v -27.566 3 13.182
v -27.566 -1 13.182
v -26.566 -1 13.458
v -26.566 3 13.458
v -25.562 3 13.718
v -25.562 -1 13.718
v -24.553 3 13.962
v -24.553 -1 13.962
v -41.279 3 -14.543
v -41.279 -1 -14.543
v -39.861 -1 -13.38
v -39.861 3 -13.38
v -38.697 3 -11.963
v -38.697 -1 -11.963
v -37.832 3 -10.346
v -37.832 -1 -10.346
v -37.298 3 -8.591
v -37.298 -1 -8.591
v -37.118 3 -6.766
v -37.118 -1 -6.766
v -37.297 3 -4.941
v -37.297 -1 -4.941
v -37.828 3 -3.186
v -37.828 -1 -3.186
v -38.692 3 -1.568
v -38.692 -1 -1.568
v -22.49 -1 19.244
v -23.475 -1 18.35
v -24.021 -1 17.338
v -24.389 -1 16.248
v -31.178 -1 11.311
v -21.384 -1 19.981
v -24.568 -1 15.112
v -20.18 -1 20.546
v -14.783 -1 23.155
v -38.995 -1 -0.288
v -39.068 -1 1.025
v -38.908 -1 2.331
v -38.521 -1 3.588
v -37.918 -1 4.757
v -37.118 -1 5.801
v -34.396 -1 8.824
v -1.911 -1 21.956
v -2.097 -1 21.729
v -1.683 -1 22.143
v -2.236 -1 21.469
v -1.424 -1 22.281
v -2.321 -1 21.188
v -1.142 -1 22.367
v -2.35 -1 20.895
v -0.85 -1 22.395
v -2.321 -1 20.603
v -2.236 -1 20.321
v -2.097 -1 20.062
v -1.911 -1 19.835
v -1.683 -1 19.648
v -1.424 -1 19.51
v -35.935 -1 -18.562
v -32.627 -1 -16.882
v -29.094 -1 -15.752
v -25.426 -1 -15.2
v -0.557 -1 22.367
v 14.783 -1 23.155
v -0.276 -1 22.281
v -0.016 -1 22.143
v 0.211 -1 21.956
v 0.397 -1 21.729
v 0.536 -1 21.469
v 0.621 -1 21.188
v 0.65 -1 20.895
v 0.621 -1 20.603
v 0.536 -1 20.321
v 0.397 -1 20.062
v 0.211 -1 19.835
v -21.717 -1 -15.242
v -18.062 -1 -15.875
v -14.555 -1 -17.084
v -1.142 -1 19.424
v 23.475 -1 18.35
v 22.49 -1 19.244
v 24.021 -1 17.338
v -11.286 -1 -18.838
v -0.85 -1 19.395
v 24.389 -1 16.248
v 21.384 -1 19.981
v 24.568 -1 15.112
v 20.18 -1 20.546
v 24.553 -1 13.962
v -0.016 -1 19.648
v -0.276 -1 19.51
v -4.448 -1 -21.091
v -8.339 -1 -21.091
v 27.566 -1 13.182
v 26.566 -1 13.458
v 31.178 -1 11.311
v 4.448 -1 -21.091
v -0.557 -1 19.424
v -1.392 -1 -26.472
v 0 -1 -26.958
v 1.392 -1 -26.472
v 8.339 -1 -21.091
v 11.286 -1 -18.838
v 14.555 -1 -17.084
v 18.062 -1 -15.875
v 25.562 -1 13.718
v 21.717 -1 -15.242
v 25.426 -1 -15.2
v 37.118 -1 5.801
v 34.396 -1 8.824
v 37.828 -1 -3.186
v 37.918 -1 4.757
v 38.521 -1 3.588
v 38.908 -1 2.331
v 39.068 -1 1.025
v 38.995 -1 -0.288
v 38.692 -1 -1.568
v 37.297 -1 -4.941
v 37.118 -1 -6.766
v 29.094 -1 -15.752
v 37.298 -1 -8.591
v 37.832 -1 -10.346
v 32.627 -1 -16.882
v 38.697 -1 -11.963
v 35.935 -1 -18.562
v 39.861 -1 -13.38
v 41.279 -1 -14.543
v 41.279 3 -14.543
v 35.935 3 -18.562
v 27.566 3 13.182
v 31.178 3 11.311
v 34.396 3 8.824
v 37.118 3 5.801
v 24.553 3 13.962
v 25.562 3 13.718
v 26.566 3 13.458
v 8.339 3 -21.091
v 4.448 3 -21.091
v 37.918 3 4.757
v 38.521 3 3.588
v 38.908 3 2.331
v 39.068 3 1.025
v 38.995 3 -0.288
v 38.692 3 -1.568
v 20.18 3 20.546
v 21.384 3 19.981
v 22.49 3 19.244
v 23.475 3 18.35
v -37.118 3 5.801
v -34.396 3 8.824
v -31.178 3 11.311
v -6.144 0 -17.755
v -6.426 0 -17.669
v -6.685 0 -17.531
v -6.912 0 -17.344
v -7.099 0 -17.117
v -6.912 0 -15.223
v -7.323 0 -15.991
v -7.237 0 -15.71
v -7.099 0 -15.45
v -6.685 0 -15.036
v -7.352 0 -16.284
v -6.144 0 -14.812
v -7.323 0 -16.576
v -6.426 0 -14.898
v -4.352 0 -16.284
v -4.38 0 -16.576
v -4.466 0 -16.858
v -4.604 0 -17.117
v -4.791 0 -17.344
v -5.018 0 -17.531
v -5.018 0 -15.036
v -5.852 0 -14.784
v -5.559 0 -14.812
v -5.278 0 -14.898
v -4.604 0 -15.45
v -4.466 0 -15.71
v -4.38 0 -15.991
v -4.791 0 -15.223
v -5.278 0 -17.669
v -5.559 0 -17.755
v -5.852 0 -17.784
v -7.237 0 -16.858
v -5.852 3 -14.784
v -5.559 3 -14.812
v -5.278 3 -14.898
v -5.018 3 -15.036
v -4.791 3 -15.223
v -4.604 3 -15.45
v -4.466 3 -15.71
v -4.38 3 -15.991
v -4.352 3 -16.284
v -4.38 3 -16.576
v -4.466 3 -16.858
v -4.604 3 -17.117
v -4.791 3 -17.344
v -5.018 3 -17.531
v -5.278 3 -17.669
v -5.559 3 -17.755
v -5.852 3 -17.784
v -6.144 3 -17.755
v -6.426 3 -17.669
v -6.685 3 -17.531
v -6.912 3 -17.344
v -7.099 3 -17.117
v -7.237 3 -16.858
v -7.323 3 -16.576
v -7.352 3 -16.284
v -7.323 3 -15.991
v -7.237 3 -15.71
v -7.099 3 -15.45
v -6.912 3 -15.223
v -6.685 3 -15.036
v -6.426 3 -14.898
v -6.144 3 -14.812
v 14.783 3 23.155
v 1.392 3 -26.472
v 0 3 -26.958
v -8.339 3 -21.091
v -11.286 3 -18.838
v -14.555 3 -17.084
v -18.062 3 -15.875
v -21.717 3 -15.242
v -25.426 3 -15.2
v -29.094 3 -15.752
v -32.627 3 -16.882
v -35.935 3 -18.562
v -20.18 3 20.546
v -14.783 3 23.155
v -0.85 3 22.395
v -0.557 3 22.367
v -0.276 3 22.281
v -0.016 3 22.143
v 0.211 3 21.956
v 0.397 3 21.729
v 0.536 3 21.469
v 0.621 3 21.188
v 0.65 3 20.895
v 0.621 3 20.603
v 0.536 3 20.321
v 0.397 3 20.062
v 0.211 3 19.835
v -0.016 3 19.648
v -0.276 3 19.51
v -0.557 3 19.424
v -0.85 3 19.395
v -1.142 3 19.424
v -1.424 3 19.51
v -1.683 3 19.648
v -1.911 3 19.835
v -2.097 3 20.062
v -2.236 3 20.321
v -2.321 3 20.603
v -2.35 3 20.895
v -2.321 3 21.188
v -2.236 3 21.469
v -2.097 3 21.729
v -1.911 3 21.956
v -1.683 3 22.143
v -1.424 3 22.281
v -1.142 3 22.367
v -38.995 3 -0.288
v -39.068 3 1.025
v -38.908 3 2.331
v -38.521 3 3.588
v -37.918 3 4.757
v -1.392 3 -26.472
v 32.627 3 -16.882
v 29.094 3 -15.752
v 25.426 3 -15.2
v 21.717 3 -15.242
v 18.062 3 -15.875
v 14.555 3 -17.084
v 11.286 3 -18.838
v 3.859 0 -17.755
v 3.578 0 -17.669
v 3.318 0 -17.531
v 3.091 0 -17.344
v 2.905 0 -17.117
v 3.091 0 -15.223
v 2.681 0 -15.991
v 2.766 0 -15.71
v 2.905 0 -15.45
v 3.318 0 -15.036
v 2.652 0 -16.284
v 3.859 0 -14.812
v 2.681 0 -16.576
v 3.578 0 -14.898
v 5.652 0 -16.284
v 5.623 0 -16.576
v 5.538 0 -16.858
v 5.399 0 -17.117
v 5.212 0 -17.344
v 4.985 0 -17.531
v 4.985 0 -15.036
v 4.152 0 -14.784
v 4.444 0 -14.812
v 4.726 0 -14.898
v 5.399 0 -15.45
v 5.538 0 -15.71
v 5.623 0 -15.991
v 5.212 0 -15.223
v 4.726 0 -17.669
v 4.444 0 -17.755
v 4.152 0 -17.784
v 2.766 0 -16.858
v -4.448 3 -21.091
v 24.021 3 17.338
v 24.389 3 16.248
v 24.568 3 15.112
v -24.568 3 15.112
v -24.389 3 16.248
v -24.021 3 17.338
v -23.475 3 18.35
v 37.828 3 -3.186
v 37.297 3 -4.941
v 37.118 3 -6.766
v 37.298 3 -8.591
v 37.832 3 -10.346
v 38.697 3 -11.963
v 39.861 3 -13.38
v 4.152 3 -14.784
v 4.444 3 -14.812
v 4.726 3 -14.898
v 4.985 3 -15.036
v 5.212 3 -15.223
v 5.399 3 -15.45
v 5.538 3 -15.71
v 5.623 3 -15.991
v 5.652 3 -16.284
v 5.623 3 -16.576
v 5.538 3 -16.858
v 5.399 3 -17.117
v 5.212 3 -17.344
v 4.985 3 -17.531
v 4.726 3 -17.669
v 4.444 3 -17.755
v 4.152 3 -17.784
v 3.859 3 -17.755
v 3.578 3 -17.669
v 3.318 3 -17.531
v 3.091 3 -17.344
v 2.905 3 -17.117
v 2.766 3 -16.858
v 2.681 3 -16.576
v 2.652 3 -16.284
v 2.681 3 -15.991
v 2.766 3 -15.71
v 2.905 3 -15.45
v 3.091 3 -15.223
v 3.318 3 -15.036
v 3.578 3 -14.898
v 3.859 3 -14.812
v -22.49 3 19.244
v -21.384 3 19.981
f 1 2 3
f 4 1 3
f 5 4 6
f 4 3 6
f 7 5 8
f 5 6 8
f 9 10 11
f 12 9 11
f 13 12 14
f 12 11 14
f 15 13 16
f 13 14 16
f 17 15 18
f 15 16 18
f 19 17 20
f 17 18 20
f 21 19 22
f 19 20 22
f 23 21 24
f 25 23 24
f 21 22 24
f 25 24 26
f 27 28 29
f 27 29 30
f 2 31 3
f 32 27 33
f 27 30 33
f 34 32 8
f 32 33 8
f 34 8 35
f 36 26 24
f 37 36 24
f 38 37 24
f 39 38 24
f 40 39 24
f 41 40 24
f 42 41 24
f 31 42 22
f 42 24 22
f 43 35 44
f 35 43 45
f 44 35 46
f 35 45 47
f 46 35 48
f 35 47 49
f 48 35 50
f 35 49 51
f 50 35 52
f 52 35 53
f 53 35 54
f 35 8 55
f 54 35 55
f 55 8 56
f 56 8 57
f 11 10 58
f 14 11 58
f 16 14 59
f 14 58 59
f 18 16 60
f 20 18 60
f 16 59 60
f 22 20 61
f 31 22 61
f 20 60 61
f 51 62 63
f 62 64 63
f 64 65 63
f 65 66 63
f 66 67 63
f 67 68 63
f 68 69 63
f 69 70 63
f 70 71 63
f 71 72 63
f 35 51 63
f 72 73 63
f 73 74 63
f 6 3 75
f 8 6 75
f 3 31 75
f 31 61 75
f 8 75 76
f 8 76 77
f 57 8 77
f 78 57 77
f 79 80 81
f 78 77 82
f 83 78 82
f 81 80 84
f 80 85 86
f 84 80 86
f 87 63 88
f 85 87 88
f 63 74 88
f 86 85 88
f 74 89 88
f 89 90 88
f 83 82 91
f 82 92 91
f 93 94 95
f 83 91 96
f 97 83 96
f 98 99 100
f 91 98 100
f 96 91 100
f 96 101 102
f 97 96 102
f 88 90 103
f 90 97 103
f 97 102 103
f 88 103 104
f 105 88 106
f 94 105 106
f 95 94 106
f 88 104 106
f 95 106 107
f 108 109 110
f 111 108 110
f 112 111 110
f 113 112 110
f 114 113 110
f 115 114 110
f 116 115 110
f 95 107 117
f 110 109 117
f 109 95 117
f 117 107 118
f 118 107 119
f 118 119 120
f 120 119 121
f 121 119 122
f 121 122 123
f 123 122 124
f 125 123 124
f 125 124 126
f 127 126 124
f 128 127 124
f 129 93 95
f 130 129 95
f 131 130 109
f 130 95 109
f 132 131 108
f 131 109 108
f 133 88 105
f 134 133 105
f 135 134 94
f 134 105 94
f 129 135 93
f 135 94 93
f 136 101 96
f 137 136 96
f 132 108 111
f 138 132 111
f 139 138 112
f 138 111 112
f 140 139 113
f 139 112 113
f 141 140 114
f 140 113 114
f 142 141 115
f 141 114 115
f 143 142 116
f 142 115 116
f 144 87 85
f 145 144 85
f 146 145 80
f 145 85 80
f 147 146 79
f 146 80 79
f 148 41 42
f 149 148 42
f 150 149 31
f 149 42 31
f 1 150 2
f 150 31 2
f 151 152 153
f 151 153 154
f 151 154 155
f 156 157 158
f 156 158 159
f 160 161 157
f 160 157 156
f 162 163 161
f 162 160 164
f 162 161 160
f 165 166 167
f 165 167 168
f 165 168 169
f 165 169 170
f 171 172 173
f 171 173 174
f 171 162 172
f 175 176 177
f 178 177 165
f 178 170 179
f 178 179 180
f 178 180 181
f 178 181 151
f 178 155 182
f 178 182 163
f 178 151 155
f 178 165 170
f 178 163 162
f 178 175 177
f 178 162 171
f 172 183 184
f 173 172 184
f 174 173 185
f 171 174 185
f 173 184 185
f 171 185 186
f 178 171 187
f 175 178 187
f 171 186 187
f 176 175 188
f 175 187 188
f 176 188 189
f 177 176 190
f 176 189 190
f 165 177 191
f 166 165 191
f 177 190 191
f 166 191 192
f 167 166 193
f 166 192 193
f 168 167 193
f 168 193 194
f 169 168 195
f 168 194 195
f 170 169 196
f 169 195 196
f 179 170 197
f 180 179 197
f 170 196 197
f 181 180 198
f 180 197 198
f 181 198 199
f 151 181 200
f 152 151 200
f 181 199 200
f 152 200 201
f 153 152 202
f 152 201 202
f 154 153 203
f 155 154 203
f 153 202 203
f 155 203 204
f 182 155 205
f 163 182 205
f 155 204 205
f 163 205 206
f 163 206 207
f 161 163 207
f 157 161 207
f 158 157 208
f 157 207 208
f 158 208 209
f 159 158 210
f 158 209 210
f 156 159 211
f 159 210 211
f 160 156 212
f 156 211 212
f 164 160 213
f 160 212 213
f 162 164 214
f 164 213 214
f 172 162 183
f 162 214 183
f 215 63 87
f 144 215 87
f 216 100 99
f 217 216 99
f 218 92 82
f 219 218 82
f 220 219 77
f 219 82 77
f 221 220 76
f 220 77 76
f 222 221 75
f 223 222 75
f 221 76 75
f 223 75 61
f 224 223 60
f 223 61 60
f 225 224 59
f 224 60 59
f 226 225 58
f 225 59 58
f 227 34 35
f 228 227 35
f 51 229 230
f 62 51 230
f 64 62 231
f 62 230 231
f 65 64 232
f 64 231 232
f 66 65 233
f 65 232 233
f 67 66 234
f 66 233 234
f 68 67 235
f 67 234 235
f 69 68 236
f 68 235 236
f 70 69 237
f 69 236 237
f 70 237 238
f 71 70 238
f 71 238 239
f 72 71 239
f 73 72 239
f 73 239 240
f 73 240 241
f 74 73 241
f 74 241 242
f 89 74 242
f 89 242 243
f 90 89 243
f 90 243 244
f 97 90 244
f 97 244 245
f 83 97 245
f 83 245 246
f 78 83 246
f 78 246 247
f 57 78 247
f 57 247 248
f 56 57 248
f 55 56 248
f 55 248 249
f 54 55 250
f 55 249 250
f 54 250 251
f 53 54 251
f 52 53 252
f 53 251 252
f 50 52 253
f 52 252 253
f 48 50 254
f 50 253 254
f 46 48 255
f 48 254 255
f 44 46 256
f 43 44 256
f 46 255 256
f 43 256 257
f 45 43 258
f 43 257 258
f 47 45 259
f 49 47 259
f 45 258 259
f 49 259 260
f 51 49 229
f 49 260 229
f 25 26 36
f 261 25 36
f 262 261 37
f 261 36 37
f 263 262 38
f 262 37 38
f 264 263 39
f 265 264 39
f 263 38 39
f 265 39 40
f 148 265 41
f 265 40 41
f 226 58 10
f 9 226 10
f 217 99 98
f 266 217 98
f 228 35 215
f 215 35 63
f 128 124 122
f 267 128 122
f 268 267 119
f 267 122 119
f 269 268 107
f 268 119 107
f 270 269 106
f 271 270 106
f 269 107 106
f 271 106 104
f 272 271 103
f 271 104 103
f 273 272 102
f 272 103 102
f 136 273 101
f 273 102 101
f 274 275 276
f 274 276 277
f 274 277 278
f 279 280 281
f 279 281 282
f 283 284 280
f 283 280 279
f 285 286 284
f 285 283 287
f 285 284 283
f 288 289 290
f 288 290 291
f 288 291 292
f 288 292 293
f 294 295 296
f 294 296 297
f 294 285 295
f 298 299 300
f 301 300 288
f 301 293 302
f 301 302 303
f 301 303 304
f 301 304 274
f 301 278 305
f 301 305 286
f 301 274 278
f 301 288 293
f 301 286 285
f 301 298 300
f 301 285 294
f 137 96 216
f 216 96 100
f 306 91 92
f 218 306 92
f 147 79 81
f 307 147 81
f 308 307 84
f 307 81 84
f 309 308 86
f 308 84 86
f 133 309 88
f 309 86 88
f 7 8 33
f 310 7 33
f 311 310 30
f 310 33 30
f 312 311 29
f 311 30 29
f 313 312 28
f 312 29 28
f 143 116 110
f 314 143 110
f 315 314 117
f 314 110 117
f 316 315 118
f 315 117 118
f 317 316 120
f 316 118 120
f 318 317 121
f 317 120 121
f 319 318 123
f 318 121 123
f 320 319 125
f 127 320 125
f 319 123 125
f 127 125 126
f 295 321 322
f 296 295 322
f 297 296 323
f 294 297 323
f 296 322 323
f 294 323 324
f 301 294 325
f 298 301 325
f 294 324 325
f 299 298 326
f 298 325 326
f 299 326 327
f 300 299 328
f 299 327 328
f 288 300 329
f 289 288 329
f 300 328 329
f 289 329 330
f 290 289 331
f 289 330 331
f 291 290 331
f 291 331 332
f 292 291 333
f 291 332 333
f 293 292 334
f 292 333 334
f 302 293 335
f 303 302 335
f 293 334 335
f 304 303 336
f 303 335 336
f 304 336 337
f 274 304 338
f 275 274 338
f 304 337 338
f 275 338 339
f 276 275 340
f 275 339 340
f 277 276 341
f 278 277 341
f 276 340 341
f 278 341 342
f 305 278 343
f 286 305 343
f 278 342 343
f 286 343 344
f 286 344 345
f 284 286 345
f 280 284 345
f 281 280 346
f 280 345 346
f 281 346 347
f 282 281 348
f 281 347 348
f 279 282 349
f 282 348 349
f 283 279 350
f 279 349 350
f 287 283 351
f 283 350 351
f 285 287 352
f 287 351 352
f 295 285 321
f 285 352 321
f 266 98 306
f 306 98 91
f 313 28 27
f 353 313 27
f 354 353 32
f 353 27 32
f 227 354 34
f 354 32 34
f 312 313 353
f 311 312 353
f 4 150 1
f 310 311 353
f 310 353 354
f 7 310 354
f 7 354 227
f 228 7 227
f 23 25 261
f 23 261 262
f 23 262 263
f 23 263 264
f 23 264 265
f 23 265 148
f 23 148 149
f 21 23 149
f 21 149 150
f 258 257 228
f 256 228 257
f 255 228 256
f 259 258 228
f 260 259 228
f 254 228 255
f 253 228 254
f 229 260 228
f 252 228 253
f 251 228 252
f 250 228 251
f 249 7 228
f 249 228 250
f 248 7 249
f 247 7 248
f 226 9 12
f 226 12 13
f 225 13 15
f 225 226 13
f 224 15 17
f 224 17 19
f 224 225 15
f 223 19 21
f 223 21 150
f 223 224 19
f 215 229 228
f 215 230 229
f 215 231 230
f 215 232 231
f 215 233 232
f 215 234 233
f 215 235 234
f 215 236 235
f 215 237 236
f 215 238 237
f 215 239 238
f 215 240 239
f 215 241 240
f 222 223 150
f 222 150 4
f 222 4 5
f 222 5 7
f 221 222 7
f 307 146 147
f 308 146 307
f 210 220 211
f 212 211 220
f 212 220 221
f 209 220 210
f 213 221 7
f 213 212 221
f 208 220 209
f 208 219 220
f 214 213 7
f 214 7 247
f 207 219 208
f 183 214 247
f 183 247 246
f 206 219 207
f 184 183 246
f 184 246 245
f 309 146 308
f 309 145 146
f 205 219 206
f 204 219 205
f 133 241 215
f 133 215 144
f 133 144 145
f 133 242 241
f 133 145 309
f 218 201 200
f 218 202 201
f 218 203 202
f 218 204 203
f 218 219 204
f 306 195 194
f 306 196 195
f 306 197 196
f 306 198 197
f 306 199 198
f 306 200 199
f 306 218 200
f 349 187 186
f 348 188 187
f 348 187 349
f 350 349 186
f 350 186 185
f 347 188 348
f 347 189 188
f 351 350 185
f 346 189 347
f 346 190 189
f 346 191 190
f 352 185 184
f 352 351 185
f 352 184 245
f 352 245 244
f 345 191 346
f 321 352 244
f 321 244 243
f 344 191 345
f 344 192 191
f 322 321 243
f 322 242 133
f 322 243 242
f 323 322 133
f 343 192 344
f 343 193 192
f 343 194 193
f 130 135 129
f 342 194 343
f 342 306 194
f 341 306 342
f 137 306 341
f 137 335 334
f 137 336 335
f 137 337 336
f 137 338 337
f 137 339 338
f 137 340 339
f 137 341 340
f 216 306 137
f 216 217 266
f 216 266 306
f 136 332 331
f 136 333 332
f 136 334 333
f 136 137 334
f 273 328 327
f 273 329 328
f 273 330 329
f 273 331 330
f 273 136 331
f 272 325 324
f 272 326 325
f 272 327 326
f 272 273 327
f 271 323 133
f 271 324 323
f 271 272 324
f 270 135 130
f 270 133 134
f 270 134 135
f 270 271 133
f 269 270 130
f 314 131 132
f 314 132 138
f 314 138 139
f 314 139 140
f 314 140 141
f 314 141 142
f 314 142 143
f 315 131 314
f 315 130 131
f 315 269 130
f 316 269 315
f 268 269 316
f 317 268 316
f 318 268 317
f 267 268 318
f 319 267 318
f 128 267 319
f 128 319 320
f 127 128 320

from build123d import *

# Parameters (mm, degrees)
BOSS_EXTRUDE1_DEPTH = 2
SCALE1_SCALE        = 2
SKETCH6_R           = 1.5
CUT_EXTRUDE2_DEPTH  = 3
SKETCH10_R          = 1.5
CUT_EXTRUDE4_DEPTH  = 10


with BuildPart() as part:
    # Sketch2 → Boss-Extrude1 (new body)
    with BuildSketch(Plane(origin=(0, 0, 0), x_dir=(1, 0, 0), z_dir=(0, 1, 0))):
        with BuildLine():
            Line((-17.967387551, 9.159795774), (-20.639475337, 7.15016677))
            ThreePointArc((-20.639475337, 7.15016677), (-18.649238809, 4.17439457), (-19.346117765, 0.662896123))
            ThreePointArc((-19.346117765, 0.662896123), (-19.45411943, -1.286546543), (-18.558961711, -3.021678736))
            ThreePointArc((-18.558961711, -3.021678736), (-16.421478173, -5.190969631), (-13.78312899, -6.712078584))
            ThreePointArc((-13.78312899, -6.712078584), (-13.032173848, -6.916004841), (-12.276686285, -7.102440046))
            ThreePointArc((-12.276686285, -7.102440046), (-12.194265553, -8.245293076), (-11.737308023, -9.296052821))
            ThreePointArc((-11.737308023, -9.296052821), (-10.975506649, -9.937799505), (-10.090124565, -10.394175126))
            Line((-10.090124565, -10.394175126), (-7.391598262, -11.698651137))
            Line((-7.391598262, -11.698651137), (7.391598262, -11.698651137))
            Line((7.391598262, -11.698651137), (10.090124565, -10.394175126))
            ThreePointArc((10.090124565, -10.394175126), (10.975506649, -9.937799505), (11.737308023, -9.296052821))
            ThreePointArc((11.737308023, -9.296052821), (12.194265553, -8.245293076), (12.276686285, -7.102440046))
            ThreePointArc((12.276686285, -7.102440046), (13.032173848, -6.916004841), (13.78312899, -6.712078584))
            ThreePointArc((13.78312899, -6.712078584), (16.421478173, -5.190969631), (18.558961711, -3.021678736))
            ThreePointArc((18.558961711, -3.021678736), (19.45411943, -1.286546543), (19.346117765, 0.662896123))
            ThreePointArc((19.346117765, 0.662896123), (18.649238809, 4.17439457), (20.639475337, 7.15016677))
            Line((20.639475337, 7.15016677), (17.967387551, 9.159795774))
            ThreePointArc((17.967387551, 9.159795774), (10.858325227, 7.499674132), (4.169484372, 10.424426945))
            Line((4.169484372, 10.424426945), (2.224138848, 10.424426945))
            Line((2.224138848, 10.424426945), (0.696104526, 13.114793475))
            Line((0.696104526, 13.114793475), (0, 13.358013588))
            Line((0, 13.358013588), (-0.696104526, 13.114793475))
            Line((-0.696104526, 13.114793475), (-2.224138848, 10.424426945))
            Line((-2.224138848, 10.424426945), (-4.169484372, 10.424426945))
            ThreePointArc((-4.169484372, 10.424426945), (-10.858325227, 7.499674132), (-17.967387551, 9.159795774))
        make_face()
    extrude(amount=BOSS_EXTRUDE1_DEPTH)


with BuildPart() as part_1:
    # Scale1: scaled about (0, 1, 0.242383844)
    add(part.part.scale(SCALE1_SCALE).moved(Location((0, -1, -0.242383844))))

    # Sketch6 → Cut-Extrude2 (cut)
    with BuildSketch(Plane(origin=(0, 3, 0), x_dir=(1, 0, 0), z_dir=(0, 1, 0))):
        with Locations(Location((-5.851533015, 16.28357055, 0), (0, 0, 270))):
            Circle(SKETCH6_R)
        with Locations(Location((4.151829214, 16.28357055, 0), (0, 0, 270))):
            Circle(SKETCH6_R)
    extrude(amount=-CUT_EXTRUDE2_DEPTH, mode=Mode.SUBTRACT)

    # Sketch10 → Cut-Extrude4 (cut)
    with BuildSketch(Plane(origin=(0, 3, 0), x_dir=(1, 0, 0), z_dir=(0, 1, 0))):
        with Locations(Location((-0.8498519, -20.895328087, 0), (0, 0, 270))):
            Circle(SKETCH10_R)
    extrude(amount=-CUT_EXTRUDE4_DEPTH, mode=Mode.SUBTRACT)


solid = part_1.part
